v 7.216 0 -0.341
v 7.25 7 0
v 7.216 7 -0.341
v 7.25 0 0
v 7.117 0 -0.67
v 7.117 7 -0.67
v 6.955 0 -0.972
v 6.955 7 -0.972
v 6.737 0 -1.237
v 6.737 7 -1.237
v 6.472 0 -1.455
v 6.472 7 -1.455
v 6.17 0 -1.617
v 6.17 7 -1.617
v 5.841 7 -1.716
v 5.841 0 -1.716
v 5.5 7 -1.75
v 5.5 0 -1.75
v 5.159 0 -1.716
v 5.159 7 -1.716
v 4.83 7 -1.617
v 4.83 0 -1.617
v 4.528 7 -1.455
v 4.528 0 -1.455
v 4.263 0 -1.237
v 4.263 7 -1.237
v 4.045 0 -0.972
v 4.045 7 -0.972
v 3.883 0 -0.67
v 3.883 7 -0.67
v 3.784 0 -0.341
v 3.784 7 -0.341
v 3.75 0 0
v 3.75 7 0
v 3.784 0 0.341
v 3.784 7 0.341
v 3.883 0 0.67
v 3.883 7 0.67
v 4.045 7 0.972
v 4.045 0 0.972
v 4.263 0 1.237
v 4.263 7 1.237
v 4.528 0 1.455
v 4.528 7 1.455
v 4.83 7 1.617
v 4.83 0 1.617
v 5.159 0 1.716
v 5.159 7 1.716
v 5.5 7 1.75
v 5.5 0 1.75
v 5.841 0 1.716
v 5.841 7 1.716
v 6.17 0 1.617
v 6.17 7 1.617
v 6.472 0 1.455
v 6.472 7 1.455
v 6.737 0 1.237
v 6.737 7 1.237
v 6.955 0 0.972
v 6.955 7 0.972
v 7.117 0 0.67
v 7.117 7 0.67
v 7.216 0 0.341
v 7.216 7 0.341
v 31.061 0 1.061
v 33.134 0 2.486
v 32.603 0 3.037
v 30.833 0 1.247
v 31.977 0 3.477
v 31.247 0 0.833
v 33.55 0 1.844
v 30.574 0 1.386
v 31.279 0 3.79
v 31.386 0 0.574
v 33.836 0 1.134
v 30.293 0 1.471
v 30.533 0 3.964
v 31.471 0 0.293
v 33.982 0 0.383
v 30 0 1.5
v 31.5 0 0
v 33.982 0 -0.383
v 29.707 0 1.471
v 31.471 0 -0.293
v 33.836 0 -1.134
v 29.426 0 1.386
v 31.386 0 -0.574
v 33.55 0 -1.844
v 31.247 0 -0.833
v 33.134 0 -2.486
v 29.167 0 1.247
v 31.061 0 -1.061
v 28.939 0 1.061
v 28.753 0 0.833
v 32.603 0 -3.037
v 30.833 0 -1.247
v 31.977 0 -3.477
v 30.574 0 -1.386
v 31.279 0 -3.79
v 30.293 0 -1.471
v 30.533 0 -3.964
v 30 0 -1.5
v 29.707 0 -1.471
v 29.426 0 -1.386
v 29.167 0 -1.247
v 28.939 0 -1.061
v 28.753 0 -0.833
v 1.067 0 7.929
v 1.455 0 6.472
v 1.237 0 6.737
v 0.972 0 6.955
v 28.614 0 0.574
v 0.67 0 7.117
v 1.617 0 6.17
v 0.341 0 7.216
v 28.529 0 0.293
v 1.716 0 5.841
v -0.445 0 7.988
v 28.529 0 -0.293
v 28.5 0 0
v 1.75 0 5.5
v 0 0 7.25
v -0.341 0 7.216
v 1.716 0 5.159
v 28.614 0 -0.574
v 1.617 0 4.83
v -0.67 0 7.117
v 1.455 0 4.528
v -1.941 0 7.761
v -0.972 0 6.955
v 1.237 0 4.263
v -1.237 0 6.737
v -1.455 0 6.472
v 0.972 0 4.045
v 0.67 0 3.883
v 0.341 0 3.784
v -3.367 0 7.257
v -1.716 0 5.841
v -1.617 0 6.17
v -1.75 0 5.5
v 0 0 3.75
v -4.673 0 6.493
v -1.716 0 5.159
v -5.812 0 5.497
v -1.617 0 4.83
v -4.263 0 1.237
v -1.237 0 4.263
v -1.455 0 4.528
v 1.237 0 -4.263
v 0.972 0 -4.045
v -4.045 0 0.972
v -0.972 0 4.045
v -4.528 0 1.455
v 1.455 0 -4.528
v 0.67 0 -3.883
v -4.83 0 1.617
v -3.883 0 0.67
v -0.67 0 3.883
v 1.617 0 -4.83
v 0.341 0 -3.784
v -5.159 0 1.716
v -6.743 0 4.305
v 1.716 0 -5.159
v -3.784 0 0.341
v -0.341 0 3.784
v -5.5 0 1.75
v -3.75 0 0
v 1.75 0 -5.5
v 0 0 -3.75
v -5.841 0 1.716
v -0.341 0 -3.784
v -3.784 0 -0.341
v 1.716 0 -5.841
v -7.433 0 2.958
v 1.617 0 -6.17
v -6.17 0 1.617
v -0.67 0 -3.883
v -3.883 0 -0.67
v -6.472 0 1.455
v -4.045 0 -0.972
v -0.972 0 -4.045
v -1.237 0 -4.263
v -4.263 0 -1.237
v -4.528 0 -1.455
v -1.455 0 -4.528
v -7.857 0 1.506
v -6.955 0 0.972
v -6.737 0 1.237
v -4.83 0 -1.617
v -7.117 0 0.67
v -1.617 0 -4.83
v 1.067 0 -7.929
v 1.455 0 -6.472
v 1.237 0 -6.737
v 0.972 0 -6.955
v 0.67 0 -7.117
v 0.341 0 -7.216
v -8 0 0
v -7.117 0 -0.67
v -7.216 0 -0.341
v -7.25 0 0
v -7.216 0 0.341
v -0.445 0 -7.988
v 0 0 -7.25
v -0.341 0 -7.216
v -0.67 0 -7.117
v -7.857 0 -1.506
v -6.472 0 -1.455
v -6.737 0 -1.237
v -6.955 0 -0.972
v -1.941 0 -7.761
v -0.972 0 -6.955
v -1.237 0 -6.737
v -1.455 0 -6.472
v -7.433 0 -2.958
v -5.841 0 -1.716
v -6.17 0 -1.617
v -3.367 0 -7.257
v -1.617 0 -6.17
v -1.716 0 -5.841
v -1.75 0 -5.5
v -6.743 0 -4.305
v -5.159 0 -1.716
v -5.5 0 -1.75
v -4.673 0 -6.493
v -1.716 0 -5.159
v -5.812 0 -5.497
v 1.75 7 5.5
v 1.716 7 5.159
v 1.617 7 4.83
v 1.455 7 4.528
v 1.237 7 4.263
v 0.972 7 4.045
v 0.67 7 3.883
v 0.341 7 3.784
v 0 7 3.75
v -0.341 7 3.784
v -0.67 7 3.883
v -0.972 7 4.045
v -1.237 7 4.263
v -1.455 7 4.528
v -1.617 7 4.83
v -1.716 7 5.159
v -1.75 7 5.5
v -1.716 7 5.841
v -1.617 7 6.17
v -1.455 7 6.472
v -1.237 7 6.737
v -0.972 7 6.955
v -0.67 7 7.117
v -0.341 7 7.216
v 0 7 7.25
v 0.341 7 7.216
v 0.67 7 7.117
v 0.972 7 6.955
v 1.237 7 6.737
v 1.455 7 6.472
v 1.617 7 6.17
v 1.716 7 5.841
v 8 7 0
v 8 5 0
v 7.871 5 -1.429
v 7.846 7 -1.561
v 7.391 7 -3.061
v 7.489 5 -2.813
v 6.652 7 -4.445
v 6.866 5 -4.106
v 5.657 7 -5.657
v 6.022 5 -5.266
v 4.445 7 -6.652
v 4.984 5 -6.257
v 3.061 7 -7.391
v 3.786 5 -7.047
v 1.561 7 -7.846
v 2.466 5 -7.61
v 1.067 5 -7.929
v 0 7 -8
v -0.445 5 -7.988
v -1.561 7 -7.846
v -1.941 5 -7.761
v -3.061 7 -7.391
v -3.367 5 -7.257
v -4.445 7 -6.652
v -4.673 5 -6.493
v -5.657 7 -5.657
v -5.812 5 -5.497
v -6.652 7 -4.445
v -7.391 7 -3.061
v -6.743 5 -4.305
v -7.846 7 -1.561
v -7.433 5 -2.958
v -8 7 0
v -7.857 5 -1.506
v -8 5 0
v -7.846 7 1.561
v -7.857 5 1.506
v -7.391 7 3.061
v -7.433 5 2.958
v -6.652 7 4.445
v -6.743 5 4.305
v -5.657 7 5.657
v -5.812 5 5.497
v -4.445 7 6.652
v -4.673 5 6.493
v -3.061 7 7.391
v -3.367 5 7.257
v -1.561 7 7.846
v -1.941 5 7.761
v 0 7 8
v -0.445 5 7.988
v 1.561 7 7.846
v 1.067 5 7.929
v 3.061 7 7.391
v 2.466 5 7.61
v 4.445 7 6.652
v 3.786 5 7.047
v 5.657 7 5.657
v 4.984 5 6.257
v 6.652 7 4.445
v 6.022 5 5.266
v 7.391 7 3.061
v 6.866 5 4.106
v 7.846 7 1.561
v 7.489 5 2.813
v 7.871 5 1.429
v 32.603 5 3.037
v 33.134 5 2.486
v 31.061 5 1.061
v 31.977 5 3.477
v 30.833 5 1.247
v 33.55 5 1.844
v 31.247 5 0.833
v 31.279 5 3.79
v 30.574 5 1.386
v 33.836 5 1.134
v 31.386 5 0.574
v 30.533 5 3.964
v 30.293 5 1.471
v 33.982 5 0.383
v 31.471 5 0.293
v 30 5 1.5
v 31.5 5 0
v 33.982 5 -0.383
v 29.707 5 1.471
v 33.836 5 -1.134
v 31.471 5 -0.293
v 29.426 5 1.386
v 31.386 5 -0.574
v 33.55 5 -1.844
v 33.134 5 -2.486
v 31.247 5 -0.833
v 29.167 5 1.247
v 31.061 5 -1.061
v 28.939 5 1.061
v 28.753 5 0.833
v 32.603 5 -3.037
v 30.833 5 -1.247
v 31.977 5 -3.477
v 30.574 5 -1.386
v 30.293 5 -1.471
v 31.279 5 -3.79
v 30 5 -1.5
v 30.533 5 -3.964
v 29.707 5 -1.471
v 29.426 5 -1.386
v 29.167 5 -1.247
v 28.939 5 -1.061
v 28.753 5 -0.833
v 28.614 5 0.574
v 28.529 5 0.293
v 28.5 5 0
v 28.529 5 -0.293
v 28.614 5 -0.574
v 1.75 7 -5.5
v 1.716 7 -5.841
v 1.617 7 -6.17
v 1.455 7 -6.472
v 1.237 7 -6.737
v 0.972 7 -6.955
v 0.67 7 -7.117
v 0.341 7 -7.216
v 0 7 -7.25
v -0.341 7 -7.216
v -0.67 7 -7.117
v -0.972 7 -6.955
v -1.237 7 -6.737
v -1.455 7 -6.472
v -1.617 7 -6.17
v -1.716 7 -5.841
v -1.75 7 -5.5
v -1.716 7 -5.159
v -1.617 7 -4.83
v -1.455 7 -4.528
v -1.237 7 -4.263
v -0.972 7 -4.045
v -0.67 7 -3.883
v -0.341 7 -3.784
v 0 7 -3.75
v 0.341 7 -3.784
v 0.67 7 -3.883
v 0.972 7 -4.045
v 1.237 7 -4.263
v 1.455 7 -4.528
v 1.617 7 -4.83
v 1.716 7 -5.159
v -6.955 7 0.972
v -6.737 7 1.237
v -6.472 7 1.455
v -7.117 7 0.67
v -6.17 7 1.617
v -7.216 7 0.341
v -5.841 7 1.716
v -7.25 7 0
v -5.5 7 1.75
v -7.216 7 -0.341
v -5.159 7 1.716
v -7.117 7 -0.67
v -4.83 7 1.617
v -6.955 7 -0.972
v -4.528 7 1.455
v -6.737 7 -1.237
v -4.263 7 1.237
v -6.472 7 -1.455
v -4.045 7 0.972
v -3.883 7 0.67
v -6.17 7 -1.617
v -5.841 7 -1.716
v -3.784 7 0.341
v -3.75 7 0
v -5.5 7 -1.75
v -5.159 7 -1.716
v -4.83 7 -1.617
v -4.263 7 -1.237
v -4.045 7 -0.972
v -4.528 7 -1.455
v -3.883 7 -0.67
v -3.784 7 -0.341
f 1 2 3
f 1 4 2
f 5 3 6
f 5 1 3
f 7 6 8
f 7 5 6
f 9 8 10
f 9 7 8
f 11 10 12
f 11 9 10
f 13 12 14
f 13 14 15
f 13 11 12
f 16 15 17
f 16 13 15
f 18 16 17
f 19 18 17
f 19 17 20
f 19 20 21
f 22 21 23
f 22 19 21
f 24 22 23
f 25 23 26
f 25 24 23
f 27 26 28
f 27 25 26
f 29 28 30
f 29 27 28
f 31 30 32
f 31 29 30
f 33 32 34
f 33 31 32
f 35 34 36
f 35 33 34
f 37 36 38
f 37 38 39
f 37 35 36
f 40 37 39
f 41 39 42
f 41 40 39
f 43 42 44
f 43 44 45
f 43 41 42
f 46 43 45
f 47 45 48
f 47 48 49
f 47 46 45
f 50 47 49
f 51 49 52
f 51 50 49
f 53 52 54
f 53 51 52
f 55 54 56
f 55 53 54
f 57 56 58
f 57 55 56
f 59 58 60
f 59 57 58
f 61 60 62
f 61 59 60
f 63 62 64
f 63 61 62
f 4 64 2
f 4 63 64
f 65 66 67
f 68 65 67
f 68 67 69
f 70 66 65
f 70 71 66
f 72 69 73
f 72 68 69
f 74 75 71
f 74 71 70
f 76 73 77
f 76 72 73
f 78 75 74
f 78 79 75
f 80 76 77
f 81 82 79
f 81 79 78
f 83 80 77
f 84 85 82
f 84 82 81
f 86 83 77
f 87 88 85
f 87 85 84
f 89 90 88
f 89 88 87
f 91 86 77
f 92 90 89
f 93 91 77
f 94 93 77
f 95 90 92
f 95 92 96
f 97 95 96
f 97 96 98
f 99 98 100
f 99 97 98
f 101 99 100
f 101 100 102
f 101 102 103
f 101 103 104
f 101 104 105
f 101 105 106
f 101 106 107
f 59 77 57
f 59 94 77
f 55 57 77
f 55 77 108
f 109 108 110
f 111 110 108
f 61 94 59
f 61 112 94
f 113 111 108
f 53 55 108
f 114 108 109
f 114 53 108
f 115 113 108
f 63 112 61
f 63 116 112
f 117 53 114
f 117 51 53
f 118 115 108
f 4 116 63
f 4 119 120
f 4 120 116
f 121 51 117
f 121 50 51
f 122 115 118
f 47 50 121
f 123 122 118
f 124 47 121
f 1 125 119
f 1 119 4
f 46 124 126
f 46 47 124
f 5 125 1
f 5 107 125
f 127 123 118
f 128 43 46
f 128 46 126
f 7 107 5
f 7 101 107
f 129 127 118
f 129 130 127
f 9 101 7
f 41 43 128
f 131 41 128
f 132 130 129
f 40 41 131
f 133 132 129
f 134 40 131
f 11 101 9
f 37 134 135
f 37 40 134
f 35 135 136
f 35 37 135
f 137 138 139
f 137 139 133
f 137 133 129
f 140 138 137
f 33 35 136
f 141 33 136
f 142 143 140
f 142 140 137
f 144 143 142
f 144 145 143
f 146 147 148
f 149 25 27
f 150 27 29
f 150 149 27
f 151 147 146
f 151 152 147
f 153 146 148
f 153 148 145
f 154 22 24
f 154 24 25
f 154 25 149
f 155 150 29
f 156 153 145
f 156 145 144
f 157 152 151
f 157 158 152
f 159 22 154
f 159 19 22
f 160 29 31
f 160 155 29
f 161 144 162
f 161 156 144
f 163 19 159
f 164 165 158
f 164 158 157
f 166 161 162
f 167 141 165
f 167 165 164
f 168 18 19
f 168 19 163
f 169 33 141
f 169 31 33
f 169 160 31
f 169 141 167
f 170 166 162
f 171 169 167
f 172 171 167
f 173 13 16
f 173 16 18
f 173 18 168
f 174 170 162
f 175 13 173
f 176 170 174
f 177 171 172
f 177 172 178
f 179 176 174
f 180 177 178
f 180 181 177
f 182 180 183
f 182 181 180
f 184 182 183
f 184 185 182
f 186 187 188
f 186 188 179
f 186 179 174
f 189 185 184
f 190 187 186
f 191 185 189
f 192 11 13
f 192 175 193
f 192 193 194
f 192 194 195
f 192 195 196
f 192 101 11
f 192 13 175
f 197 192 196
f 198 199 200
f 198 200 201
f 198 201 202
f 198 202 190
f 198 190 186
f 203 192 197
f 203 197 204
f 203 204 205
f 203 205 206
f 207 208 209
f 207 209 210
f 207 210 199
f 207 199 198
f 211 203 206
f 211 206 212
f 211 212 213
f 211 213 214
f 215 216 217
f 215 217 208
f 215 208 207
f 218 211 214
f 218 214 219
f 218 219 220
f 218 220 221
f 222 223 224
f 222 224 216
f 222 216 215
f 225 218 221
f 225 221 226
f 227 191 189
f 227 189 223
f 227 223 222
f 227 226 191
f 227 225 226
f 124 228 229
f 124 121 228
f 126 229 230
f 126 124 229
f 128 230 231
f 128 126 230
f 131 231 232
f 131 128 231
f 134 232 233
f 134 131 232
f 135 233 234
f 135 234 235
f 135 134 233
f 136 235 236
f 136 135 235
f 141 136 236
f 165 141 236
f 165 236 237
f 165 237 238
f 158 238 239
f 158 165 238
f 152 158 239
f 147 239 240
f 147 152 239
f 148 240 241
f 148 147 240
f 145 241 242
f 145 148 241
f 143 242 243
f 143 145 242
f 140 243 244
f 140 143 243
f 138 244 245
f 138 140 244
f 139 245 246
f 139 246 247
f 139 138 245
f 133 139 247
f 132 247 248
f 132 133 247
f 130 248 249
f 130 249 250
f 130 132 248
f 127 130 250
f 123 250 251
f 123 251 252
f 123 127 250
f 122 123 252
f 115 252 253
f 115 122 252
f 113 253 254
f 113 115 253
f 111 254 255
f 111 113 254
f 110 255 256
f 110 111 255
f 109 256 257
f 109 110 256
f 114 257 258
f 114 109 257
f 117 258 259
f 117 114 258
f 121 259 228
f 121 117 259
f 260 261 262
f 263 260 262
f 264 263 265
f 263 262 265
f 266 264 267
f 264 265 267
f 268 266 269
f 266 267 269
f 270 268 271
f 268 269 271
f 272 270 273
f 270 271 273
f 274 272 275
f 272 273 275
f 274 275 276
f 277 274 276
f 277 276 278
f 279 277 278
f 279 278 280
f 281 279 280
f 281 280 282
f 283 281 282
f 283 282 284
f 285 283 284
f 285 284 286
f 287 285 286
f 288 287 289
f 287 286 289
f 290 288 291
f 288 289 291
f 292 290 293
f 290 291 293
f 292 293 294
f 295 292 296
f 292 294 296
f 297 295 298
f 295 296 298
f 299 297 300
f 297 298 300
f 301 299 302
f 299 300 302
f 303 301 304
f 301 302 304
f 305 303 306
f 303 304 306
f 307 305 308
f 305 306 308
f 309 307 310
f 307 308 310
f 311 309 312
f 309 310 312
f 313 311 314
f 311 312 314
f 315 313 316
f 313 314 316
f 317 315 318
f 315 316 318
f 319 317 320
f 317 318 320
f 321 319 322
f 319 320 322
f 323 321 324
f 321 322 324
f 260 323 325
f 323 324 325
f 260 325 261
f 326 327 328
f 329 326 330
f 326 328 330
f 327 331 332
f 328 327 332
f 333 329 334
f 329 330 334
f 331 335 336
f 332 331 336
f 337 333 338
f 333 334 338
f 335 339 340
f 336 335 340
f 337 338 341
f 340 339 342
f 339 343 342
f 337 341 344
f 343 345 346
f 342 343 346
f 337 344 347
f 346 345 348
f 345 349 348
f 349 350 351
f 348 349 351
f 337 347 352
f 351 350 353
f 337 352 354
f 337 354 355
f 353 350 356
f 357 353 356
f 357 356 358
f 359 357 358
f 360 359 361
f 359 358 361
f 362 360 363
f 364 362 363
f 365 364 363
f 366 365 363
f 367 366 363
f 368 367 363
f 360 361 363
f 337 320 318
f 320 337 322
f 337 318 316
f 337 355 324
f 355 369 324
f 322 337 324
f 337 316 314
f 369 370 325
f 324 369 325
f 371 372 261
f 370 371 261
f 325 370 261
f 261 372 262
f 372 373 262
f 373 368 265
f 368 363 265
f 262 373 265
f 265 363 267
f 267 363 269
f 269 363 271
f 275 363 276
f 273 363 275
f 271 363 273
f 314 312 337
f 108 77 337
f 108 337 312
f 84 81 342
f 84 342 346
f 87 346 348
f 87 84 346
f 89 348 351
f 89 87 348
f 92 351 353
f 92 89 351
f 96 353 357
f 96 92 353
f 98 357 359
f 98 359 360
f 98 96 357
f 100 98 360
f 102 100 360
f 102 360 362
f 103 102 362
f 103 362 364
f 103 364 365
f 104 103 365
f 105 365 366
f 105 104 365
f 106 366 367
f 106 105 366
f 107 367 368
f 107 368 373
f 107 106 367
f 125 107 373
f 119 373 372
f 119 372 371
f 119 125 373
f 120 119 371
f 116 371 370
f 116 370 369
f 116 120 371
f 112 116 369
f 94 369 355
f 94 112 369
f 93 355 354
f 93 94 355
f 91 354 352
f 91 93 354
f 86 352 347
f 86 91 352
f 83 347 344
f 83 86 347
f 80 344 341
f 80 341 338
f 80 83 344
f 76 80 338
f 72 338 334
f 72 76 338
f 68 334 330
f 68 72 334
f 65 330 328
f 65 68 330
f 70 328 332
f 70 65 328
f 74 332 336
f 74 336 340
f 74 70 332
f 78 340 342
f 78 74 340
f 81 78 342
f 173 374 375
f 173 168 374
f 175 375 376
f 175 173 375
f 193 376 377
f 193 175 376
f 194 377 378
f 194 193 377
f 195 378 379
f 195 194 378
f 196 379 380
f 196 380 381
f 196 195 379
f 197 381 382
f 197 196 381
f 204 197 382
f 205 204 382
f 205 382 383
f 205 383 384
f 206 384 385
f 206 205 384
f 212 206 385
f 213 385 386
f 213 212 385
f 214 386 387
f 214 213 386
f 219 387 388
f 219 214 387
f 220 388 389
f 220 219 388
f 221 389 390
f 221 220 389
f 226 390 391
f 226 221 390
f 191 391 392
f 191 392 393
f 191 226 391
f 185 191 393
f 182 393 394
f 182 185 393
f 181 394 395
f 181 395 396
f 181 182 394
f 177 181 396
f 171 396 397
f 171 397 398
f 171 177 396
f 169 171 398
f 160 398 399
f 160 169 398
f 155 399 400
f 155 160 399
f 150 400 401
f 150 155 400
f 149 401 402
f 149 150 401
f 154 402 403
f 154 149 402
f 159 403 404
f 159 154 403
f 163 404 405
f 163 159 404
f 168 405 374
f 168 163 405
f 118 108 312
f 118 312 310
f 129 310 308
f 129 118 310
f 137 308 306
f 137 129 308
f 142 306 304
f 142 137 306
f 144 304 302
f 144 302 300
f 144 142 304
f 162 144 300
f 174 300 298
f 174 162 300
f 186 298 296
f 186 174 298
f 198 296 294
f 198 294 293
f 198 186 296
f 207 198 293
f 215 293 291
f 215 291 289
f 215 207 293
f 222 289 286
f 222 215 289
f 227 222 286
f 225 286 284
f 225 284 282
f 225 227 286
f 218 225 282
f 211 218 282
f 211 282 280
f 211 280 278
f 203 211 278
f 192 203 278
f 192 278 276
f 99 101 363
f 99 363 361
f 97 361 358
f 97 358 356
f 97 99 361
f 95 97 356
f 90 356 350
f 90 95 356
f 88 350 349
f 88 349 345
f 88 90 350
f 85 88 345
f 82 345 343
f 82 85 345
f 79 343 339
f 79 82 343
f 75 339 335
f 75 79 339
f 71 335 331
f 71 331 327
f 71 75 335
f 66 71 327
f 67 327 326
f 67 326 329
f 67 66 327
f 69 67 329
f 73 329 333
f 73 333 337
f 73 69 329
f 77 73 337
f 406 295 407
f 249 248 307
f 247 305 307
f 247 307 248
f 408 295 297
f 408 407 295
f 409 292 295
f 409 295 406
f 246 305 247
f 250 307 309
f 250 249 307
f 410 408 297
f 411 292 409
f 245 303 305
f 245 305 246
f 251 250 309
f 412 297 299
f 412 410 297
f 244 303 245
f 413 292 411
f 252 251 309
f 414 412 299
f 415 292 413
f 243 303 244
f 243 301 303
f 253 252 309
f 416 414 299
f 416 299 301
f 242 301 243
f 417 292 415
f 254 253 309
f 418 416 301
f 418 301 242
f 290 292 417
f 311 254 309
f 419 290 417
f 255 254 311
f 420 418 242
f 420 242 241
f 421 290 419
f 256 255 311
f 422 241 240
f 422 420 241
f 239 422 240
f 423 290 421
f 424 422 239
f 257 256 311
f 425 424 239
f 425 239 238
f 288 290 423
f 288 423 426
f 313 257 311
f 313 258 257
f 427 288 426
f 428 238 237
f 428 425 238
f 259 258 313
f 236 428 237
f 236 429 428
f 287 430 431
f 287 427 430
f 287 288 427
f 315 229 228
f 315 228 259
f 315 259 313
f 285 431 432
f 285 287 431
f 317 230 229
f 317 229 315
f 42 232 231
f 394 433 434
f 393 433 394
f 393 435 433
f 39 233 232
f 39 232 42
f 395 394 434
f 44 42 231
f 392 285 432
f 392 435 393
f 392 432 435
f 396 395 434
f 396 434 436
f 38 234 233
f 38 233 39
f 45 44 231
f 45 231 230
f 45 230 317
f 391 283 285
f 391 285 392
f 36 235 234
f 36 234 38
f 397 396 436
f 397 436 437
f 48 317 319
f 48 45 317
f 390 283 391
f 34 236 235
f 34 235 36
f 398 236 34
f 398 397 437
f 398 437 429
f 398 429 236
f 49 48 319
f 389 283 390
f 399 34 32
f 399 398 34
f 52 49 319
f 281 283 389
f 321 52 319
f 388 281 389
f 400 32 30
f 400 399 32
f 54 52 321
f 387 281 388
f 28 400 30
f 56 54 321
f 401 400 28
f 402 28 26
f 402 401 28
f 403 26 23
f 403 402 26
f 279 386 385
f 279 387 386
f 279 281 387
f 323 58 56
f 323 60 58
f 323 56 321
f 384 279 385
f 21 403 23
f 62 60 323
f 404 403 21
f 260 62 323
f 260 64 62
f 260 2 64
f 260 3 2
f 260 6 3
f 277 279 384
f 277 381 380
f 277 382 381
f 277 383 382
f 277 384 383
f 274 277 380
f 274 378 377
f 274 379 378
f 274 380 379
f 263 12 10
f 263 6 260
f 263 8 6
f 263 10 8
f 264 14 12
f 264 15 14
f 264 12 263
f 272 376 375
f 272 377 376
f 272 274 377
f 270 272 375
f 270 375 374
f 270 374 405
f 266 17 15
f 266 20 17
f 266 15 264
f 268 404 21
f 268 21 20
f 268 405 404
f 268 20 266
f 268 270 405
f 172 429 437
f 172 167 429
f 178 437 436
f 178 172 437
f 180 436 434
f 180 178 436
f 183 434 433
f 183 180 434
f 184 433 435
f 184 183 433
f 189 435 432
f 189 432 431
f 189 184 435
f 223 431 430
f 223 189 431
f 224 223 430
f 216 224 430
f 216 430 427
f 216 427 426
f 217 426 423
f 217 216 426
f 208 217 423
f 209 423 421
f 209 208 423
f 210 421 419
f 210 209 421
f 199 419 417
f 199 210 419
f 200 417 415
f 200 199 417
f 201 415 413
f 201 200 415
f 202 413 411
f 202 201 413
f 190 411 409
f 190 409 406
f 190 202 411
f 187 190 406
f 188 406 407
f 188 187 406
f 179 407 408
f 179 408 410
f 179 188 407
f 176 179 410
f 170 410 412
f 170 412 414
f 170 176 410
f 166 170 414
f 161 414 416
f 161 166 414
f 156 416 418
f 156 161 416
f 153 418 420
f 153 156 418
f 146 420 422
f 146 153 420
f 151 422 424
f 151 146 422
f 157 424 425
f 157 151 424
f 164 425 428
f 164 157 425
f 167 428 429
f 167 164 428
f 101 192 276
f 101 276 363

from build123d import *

# Parameters (mm, degrees)
SKETCH1_R           = 1.5
SKETCH1_R_2         = 1.75
BOSS_EXTRUDE1_DEPTH = 5
SKETCH2_R           = 8
SKETCH2_R_2         = 1.75
BOSS_EXTRUDE2_DEPTH = 2


with BuildPart() as part:
    # Sketch1 → Boss-Extrude1 (new body)
    with BuildSketch(Plane(origin=(0, 0, 0), x_dir=(1, 0, 0), z_dir=(0, 1, 0))):
        with BuildLine():
            Line((1.066666667, 7.928569999), (30.533333333, 3.964284999))
            ThreePointArc((30.533333333, 3.964284999), (34, 0), (30.533333333, -3.964284999))
            Line((30.533333333, -3.964284999), (1.066666667, -7.928569999))
            ThreePointArc((1.066666667, -7.928569999), (-8, 0), (1.066666667, 7.928569999))
        make_face()
        with Locations((30, 0)):
            Circle(SKETCH1_R, mode=Mode.SUBTRACT)
        with Locations((-5.5, 0)):
            Circle(SKETCH1_R_2, mode=Mode.SUBTRACT)
        with Locations((0, 5.5)):
            Circle(SKETCH1_R_2, mode=Mode.SUBTRACT)
        with Locations((5.5, 0)):
            Circle(SKETCH1_R_2, mode=Mode.SUBTRACT)
        with Locations((0, -5.5)):
            Circle(SKETCH1_R_2, mode=Mode.SUBTRACT)
    extrude(amount=BOSS_EXTRUDE1_DEPTH)

    # Sketch2 → Boss-Extrude2 (add)
    with BuildSketch(Plane(origin=(0, 5, 0), x_dir=(1, 0, 0), z_dir=(0, 1, 0))):
        Circle(SKETCH2_R)
        with Locations((-5.5, 0)):
            Circle(SKETCH2_R_2, mode=Mode.SUBTRACT)
        with Locations((0, -5.5)):
            Circle(SKETCH2_R_2, mode=Mode.SUBTRACT)
        with Locations((5.5, 0)):
            Circle(SKETCH2_R_2, mode=Mode.SUBTRACT)
        with Locations((0, 5.5)):
            Circle(SKETCH2_R_2, mode=Mode.SUBTRACT)
    extrude(amount=BOSS_EXTRUDE2_DEPTH)


solid = part.part
